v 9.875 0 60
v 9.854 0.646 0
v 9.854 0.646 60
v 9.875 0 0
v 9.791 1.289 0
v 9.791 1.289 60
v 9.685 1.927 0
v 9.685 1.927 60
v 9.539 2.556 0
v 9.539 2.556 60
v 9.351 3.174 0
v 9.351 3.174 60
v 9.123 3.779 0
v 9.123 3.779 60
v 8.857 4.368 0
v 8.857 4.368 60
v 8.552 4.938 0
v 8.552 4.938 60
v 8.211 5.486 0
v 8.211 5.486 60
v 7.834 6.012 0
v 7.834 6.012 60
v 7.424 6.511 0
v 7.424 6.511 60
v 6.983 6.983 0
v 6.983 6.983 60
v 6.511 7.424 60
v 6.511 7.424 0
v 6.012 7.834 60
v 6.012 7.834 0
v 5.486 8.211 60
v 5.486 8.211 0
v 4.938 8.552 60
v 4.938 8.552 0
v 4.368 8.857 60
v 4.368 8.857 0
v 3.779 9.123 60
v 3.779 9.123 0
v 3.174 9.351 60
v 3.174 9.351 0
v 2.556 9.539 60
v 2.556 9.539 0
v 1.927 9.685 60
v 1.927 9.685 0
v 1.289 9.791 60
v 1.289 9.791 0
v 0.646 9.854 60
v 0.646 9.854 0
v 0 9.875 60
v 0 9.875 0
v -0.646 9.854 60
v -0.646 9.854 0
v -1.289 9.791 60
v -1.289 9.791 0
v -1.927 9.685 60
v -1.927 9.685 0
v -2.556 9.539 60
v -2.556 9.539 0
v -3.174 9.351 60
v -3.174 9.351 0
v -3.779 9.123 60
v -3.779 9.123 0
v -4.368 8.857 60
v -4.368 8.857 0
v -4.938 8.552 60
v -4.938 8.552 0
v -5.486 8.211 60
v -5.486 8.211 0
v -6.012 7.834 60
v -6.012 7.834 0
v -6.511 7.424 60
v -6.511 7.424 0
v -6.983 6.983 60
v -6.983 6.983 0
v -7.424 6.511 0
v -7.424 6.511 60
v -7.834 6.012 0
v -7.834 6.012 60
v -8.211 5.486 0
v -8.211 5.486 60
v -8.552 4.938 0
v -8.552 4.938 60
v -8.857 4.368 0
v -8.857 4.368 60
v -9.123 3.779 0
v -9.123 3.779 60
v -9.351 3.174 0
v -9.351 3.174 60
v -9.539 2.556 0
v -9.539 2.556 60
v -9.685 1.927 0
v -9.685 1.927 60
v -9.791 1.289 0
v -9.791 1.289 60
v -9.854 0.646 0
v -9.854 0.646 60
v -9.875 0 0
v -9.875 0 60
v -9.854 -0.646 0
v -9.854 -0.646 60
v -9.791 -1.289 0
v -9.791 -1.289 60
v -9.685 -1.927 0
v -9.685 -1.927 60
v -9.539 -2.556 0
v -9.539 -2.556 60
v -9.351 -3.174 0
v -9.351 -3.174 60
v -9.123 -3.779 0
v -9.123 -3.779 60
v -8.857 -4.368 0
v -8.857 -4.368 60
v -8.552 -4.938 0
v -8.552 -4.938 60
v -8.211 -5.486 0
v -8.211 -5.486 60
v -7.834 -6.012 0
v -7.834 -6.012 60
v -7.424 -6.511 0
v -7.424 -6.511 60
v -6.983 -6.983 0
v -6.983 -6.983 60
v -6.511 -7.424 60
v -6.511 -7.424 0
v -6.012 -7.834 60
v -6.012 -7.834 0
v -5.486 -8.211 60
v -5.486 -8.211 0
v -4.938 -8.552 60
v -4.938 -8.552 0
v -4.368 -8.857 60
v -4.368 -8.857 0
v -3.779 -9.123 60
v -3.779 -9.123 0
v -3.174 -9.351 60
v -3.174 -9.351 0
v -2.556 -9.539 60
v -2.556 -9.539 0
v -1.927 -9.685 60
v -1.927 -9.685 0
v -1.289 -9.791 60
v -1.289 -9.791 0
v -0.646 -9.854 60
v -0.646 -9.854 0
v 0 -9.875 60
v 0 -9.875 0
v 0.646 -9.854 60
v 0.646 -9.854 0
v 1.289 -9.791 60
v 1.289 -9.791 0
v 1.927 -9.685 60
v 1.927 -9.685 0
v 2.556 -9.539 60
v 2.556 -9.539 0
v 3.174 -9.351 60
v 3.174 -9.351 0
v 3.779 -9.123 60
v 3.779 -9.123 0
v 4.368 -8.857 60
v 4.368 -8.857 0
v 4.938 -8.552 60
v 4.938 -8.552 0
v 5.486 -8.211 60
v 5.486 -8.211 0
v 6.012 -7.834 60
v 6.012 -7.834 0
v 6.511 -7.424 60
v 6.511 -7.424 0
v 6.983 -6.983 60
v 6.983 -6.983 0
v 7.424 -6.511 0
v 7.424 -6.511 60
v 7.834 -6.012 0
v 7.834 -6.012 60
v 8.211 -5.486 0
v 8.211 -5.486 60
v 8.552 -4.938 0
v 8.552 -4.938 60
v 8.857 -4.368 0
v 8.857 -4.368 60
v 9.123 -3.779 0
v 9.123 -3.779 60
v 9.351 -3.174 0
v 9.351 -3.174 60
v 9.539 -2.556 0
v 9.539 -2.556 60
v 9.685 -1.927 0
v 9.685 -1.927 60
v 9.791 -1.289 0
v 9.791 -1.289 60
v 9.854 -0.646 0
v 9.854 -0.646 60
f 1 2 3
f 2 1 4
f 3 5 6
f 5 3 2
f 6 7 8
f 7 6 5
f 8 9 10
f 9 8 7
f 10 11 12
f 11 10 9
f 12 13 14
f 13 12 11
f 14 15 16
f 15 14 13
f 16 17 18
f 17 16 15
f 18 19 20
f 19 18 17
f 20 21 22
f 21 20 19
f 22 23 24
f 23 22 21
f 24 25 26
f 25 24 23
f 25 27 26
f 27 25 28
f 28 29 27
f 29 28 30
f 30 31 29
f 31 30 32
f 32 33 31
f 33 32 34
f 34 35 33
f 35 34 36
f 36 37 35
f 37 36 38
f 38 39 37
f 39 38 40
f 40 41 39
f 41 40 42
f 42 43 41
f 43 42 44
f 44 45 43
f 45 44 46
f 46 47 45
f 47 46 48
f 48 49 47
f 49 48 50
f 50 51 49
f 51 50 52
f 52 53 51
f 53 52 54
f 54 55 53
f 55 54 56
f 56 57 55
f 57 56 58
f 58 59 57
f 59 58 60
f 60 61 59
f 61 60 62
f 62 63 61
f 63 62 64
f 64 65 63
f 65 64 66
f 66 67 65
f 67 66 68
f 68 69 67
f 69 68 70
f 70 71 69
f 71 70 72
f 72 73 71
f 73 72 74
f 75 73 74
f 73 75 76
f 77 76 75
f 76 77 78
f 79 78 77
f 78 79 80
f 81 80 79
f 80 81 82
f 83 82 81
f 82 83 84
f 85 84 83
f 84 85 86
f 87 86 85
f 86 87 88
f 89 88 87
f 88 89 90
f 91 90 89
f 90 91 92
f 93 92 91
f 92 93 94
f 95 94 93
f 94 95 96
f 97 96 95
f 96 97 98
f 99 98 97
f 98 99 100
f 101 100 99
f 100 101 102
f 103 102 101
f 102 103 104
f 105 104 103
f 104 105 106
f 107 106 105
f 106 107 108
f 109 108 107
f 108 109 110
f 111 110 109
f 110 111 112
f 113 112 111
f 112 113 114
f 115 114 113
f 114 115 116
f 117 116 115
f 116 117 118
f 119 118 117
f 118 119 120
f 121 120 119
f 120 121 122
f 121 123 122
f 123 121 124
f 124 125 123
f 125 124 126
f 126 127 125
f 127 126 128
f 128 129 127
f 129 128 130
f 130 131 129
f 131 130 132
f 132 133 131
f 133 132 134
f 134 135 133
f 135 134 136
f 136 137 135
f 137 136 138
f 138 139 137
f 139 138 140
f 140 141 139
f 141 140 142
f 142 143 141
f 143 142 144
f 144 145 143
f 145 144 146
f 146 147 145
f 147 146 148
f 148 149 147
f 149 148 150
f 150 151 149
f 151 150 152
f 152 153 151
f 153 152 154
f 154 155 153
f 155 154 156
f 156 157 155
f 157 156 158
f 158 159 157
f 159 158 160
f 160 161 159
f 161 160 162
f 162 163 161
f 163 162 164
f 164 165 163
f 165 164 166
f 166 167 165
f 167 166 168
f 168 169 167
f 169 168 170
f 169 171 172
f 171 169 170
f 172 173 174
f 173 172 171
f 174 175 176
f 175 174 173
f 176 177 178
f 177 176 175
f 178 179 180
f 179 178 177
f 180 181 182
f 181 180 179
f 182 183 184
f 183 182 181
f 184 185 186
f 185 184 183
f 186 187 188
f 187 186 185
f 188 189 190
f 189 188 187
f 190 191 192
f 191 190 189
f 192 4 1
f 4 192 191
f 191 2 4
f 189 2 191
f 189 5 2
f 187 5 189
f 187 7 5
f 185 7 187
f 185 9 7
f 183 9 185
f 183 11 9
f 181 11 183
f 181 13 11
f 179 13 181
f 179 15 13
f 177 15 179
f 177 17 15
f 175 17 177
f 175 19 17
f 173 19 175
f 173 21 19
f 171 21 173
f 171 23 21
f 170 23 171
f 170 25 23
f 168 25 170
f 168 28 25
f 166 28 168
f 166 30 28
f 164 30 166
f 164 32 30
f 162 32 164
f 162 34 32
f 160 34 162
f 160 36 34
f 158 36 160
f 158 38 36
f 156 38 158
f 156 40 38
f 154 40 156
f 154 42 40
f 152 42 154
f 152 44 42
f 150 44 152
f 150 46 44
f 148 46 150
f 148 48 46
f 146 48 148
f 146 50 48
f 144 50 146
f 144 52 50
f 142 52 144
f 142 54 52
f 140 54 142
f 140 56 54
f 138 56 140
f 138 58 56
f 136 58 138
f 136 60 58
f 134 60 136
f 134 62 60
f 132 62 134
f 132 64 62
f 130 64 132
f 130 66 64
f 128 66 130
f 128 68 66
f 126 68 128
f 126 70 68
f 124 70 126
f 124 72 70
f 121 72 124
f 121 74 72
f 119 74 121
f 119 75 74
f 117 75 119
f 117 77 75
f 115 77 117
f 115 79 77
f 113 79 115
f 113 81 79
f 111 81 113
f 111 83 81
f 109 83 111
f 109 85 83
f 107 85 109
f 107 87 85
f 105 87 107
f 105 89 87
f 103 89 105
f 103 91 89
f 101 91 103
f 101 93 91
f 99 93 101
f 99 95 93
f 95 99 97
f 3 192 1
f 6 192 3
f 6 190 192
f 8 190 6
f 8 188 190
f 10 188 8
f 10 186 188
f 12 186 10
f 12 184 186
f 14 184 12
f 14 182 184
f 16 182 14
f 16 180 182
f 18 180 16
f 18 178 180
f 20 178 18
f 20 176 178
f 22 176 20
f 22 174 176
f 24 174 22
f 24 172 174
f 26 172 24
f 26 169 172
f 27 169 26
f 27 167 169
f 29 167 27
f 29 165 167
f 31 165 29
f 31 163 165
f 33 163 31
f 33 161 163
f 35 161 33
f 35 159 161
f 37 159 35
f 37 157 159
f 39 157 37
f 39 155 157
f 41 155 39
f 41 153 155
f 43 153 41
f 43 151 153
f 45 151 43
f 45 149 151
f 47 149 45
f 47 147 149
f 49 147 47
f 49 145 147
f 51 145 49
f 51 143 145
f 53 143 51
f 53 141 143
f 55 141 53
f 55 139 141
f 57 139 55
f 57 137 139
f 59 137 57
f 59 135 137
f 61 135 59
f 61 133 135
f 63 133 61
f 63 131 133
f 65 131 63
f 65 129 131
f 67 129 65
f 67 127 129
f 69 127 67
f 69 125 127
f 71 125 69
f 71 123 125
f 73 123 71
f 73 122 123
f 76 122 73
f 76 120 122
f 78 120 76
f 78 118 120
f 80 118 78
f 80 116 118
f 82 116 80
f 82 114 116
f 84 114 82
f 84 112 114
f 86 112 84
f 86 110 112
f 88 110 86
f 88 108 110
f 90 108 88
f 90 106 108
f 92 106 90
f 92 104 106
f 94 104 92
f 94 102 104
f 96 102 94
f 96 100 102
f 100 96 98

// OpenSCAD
footLength = 25;
connectDiameter = 19.75;
standDiameter = 12;
connectorLength = 60;

foot = 0;

$fn = 96;

if (foot) {
    cylinder(d1=connectDiameter,d2=standDiameter,h=footLength);
}
else {
    cylinder(d=connectDiameter,h=connectorLength);
}
